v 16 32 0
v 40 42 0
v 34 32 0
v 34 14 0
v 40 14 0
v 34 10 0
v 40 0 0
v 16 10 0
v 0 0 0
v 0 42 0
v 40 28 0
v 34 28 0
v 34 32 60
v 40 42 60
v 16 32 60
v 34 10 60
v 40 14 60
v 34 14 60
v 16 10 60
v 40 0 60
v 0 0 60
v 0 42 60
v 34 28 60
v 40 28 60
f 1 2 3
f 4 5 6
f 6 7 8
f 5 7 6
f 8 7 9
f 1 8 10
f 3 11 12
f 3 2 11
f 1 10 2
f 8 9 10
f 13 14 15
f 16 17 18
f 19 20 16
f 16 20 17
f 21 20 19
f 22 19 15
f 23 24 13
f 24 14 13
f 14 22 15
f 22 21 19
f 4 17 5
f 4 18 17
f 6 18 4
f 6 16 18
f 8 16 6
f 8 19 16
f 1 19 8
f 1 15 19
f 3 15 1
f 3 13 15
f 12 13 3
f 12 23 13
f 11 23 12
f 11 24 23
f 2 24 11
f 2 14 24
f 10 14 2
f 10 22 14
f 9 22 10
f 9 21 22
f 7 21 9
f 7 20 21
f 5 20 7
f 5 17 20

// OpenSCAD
$fn = 32;

// ----------------------------------------------------------------------
// T-slot rail: 40 x 42 mm section, 60 mm long
// ----------------------------------------------------------------------

// --- parameters (mm) ---
profile_height = 60;      // extrusion height
profile_points = 12;      // points of the closed outline

profile = [[0, 0], [40, 0], [40, 14], [34, 14], [34, 10], [16, 10], [16, 32], [34, 32], [34, 28], [40, 28], [40, 42], [0, 42]];  // single closed polygon, 12 points, counter clockwise

// --- the one profile operation ---
linear_extrude(height = profile_height) polygon(points = profile);
